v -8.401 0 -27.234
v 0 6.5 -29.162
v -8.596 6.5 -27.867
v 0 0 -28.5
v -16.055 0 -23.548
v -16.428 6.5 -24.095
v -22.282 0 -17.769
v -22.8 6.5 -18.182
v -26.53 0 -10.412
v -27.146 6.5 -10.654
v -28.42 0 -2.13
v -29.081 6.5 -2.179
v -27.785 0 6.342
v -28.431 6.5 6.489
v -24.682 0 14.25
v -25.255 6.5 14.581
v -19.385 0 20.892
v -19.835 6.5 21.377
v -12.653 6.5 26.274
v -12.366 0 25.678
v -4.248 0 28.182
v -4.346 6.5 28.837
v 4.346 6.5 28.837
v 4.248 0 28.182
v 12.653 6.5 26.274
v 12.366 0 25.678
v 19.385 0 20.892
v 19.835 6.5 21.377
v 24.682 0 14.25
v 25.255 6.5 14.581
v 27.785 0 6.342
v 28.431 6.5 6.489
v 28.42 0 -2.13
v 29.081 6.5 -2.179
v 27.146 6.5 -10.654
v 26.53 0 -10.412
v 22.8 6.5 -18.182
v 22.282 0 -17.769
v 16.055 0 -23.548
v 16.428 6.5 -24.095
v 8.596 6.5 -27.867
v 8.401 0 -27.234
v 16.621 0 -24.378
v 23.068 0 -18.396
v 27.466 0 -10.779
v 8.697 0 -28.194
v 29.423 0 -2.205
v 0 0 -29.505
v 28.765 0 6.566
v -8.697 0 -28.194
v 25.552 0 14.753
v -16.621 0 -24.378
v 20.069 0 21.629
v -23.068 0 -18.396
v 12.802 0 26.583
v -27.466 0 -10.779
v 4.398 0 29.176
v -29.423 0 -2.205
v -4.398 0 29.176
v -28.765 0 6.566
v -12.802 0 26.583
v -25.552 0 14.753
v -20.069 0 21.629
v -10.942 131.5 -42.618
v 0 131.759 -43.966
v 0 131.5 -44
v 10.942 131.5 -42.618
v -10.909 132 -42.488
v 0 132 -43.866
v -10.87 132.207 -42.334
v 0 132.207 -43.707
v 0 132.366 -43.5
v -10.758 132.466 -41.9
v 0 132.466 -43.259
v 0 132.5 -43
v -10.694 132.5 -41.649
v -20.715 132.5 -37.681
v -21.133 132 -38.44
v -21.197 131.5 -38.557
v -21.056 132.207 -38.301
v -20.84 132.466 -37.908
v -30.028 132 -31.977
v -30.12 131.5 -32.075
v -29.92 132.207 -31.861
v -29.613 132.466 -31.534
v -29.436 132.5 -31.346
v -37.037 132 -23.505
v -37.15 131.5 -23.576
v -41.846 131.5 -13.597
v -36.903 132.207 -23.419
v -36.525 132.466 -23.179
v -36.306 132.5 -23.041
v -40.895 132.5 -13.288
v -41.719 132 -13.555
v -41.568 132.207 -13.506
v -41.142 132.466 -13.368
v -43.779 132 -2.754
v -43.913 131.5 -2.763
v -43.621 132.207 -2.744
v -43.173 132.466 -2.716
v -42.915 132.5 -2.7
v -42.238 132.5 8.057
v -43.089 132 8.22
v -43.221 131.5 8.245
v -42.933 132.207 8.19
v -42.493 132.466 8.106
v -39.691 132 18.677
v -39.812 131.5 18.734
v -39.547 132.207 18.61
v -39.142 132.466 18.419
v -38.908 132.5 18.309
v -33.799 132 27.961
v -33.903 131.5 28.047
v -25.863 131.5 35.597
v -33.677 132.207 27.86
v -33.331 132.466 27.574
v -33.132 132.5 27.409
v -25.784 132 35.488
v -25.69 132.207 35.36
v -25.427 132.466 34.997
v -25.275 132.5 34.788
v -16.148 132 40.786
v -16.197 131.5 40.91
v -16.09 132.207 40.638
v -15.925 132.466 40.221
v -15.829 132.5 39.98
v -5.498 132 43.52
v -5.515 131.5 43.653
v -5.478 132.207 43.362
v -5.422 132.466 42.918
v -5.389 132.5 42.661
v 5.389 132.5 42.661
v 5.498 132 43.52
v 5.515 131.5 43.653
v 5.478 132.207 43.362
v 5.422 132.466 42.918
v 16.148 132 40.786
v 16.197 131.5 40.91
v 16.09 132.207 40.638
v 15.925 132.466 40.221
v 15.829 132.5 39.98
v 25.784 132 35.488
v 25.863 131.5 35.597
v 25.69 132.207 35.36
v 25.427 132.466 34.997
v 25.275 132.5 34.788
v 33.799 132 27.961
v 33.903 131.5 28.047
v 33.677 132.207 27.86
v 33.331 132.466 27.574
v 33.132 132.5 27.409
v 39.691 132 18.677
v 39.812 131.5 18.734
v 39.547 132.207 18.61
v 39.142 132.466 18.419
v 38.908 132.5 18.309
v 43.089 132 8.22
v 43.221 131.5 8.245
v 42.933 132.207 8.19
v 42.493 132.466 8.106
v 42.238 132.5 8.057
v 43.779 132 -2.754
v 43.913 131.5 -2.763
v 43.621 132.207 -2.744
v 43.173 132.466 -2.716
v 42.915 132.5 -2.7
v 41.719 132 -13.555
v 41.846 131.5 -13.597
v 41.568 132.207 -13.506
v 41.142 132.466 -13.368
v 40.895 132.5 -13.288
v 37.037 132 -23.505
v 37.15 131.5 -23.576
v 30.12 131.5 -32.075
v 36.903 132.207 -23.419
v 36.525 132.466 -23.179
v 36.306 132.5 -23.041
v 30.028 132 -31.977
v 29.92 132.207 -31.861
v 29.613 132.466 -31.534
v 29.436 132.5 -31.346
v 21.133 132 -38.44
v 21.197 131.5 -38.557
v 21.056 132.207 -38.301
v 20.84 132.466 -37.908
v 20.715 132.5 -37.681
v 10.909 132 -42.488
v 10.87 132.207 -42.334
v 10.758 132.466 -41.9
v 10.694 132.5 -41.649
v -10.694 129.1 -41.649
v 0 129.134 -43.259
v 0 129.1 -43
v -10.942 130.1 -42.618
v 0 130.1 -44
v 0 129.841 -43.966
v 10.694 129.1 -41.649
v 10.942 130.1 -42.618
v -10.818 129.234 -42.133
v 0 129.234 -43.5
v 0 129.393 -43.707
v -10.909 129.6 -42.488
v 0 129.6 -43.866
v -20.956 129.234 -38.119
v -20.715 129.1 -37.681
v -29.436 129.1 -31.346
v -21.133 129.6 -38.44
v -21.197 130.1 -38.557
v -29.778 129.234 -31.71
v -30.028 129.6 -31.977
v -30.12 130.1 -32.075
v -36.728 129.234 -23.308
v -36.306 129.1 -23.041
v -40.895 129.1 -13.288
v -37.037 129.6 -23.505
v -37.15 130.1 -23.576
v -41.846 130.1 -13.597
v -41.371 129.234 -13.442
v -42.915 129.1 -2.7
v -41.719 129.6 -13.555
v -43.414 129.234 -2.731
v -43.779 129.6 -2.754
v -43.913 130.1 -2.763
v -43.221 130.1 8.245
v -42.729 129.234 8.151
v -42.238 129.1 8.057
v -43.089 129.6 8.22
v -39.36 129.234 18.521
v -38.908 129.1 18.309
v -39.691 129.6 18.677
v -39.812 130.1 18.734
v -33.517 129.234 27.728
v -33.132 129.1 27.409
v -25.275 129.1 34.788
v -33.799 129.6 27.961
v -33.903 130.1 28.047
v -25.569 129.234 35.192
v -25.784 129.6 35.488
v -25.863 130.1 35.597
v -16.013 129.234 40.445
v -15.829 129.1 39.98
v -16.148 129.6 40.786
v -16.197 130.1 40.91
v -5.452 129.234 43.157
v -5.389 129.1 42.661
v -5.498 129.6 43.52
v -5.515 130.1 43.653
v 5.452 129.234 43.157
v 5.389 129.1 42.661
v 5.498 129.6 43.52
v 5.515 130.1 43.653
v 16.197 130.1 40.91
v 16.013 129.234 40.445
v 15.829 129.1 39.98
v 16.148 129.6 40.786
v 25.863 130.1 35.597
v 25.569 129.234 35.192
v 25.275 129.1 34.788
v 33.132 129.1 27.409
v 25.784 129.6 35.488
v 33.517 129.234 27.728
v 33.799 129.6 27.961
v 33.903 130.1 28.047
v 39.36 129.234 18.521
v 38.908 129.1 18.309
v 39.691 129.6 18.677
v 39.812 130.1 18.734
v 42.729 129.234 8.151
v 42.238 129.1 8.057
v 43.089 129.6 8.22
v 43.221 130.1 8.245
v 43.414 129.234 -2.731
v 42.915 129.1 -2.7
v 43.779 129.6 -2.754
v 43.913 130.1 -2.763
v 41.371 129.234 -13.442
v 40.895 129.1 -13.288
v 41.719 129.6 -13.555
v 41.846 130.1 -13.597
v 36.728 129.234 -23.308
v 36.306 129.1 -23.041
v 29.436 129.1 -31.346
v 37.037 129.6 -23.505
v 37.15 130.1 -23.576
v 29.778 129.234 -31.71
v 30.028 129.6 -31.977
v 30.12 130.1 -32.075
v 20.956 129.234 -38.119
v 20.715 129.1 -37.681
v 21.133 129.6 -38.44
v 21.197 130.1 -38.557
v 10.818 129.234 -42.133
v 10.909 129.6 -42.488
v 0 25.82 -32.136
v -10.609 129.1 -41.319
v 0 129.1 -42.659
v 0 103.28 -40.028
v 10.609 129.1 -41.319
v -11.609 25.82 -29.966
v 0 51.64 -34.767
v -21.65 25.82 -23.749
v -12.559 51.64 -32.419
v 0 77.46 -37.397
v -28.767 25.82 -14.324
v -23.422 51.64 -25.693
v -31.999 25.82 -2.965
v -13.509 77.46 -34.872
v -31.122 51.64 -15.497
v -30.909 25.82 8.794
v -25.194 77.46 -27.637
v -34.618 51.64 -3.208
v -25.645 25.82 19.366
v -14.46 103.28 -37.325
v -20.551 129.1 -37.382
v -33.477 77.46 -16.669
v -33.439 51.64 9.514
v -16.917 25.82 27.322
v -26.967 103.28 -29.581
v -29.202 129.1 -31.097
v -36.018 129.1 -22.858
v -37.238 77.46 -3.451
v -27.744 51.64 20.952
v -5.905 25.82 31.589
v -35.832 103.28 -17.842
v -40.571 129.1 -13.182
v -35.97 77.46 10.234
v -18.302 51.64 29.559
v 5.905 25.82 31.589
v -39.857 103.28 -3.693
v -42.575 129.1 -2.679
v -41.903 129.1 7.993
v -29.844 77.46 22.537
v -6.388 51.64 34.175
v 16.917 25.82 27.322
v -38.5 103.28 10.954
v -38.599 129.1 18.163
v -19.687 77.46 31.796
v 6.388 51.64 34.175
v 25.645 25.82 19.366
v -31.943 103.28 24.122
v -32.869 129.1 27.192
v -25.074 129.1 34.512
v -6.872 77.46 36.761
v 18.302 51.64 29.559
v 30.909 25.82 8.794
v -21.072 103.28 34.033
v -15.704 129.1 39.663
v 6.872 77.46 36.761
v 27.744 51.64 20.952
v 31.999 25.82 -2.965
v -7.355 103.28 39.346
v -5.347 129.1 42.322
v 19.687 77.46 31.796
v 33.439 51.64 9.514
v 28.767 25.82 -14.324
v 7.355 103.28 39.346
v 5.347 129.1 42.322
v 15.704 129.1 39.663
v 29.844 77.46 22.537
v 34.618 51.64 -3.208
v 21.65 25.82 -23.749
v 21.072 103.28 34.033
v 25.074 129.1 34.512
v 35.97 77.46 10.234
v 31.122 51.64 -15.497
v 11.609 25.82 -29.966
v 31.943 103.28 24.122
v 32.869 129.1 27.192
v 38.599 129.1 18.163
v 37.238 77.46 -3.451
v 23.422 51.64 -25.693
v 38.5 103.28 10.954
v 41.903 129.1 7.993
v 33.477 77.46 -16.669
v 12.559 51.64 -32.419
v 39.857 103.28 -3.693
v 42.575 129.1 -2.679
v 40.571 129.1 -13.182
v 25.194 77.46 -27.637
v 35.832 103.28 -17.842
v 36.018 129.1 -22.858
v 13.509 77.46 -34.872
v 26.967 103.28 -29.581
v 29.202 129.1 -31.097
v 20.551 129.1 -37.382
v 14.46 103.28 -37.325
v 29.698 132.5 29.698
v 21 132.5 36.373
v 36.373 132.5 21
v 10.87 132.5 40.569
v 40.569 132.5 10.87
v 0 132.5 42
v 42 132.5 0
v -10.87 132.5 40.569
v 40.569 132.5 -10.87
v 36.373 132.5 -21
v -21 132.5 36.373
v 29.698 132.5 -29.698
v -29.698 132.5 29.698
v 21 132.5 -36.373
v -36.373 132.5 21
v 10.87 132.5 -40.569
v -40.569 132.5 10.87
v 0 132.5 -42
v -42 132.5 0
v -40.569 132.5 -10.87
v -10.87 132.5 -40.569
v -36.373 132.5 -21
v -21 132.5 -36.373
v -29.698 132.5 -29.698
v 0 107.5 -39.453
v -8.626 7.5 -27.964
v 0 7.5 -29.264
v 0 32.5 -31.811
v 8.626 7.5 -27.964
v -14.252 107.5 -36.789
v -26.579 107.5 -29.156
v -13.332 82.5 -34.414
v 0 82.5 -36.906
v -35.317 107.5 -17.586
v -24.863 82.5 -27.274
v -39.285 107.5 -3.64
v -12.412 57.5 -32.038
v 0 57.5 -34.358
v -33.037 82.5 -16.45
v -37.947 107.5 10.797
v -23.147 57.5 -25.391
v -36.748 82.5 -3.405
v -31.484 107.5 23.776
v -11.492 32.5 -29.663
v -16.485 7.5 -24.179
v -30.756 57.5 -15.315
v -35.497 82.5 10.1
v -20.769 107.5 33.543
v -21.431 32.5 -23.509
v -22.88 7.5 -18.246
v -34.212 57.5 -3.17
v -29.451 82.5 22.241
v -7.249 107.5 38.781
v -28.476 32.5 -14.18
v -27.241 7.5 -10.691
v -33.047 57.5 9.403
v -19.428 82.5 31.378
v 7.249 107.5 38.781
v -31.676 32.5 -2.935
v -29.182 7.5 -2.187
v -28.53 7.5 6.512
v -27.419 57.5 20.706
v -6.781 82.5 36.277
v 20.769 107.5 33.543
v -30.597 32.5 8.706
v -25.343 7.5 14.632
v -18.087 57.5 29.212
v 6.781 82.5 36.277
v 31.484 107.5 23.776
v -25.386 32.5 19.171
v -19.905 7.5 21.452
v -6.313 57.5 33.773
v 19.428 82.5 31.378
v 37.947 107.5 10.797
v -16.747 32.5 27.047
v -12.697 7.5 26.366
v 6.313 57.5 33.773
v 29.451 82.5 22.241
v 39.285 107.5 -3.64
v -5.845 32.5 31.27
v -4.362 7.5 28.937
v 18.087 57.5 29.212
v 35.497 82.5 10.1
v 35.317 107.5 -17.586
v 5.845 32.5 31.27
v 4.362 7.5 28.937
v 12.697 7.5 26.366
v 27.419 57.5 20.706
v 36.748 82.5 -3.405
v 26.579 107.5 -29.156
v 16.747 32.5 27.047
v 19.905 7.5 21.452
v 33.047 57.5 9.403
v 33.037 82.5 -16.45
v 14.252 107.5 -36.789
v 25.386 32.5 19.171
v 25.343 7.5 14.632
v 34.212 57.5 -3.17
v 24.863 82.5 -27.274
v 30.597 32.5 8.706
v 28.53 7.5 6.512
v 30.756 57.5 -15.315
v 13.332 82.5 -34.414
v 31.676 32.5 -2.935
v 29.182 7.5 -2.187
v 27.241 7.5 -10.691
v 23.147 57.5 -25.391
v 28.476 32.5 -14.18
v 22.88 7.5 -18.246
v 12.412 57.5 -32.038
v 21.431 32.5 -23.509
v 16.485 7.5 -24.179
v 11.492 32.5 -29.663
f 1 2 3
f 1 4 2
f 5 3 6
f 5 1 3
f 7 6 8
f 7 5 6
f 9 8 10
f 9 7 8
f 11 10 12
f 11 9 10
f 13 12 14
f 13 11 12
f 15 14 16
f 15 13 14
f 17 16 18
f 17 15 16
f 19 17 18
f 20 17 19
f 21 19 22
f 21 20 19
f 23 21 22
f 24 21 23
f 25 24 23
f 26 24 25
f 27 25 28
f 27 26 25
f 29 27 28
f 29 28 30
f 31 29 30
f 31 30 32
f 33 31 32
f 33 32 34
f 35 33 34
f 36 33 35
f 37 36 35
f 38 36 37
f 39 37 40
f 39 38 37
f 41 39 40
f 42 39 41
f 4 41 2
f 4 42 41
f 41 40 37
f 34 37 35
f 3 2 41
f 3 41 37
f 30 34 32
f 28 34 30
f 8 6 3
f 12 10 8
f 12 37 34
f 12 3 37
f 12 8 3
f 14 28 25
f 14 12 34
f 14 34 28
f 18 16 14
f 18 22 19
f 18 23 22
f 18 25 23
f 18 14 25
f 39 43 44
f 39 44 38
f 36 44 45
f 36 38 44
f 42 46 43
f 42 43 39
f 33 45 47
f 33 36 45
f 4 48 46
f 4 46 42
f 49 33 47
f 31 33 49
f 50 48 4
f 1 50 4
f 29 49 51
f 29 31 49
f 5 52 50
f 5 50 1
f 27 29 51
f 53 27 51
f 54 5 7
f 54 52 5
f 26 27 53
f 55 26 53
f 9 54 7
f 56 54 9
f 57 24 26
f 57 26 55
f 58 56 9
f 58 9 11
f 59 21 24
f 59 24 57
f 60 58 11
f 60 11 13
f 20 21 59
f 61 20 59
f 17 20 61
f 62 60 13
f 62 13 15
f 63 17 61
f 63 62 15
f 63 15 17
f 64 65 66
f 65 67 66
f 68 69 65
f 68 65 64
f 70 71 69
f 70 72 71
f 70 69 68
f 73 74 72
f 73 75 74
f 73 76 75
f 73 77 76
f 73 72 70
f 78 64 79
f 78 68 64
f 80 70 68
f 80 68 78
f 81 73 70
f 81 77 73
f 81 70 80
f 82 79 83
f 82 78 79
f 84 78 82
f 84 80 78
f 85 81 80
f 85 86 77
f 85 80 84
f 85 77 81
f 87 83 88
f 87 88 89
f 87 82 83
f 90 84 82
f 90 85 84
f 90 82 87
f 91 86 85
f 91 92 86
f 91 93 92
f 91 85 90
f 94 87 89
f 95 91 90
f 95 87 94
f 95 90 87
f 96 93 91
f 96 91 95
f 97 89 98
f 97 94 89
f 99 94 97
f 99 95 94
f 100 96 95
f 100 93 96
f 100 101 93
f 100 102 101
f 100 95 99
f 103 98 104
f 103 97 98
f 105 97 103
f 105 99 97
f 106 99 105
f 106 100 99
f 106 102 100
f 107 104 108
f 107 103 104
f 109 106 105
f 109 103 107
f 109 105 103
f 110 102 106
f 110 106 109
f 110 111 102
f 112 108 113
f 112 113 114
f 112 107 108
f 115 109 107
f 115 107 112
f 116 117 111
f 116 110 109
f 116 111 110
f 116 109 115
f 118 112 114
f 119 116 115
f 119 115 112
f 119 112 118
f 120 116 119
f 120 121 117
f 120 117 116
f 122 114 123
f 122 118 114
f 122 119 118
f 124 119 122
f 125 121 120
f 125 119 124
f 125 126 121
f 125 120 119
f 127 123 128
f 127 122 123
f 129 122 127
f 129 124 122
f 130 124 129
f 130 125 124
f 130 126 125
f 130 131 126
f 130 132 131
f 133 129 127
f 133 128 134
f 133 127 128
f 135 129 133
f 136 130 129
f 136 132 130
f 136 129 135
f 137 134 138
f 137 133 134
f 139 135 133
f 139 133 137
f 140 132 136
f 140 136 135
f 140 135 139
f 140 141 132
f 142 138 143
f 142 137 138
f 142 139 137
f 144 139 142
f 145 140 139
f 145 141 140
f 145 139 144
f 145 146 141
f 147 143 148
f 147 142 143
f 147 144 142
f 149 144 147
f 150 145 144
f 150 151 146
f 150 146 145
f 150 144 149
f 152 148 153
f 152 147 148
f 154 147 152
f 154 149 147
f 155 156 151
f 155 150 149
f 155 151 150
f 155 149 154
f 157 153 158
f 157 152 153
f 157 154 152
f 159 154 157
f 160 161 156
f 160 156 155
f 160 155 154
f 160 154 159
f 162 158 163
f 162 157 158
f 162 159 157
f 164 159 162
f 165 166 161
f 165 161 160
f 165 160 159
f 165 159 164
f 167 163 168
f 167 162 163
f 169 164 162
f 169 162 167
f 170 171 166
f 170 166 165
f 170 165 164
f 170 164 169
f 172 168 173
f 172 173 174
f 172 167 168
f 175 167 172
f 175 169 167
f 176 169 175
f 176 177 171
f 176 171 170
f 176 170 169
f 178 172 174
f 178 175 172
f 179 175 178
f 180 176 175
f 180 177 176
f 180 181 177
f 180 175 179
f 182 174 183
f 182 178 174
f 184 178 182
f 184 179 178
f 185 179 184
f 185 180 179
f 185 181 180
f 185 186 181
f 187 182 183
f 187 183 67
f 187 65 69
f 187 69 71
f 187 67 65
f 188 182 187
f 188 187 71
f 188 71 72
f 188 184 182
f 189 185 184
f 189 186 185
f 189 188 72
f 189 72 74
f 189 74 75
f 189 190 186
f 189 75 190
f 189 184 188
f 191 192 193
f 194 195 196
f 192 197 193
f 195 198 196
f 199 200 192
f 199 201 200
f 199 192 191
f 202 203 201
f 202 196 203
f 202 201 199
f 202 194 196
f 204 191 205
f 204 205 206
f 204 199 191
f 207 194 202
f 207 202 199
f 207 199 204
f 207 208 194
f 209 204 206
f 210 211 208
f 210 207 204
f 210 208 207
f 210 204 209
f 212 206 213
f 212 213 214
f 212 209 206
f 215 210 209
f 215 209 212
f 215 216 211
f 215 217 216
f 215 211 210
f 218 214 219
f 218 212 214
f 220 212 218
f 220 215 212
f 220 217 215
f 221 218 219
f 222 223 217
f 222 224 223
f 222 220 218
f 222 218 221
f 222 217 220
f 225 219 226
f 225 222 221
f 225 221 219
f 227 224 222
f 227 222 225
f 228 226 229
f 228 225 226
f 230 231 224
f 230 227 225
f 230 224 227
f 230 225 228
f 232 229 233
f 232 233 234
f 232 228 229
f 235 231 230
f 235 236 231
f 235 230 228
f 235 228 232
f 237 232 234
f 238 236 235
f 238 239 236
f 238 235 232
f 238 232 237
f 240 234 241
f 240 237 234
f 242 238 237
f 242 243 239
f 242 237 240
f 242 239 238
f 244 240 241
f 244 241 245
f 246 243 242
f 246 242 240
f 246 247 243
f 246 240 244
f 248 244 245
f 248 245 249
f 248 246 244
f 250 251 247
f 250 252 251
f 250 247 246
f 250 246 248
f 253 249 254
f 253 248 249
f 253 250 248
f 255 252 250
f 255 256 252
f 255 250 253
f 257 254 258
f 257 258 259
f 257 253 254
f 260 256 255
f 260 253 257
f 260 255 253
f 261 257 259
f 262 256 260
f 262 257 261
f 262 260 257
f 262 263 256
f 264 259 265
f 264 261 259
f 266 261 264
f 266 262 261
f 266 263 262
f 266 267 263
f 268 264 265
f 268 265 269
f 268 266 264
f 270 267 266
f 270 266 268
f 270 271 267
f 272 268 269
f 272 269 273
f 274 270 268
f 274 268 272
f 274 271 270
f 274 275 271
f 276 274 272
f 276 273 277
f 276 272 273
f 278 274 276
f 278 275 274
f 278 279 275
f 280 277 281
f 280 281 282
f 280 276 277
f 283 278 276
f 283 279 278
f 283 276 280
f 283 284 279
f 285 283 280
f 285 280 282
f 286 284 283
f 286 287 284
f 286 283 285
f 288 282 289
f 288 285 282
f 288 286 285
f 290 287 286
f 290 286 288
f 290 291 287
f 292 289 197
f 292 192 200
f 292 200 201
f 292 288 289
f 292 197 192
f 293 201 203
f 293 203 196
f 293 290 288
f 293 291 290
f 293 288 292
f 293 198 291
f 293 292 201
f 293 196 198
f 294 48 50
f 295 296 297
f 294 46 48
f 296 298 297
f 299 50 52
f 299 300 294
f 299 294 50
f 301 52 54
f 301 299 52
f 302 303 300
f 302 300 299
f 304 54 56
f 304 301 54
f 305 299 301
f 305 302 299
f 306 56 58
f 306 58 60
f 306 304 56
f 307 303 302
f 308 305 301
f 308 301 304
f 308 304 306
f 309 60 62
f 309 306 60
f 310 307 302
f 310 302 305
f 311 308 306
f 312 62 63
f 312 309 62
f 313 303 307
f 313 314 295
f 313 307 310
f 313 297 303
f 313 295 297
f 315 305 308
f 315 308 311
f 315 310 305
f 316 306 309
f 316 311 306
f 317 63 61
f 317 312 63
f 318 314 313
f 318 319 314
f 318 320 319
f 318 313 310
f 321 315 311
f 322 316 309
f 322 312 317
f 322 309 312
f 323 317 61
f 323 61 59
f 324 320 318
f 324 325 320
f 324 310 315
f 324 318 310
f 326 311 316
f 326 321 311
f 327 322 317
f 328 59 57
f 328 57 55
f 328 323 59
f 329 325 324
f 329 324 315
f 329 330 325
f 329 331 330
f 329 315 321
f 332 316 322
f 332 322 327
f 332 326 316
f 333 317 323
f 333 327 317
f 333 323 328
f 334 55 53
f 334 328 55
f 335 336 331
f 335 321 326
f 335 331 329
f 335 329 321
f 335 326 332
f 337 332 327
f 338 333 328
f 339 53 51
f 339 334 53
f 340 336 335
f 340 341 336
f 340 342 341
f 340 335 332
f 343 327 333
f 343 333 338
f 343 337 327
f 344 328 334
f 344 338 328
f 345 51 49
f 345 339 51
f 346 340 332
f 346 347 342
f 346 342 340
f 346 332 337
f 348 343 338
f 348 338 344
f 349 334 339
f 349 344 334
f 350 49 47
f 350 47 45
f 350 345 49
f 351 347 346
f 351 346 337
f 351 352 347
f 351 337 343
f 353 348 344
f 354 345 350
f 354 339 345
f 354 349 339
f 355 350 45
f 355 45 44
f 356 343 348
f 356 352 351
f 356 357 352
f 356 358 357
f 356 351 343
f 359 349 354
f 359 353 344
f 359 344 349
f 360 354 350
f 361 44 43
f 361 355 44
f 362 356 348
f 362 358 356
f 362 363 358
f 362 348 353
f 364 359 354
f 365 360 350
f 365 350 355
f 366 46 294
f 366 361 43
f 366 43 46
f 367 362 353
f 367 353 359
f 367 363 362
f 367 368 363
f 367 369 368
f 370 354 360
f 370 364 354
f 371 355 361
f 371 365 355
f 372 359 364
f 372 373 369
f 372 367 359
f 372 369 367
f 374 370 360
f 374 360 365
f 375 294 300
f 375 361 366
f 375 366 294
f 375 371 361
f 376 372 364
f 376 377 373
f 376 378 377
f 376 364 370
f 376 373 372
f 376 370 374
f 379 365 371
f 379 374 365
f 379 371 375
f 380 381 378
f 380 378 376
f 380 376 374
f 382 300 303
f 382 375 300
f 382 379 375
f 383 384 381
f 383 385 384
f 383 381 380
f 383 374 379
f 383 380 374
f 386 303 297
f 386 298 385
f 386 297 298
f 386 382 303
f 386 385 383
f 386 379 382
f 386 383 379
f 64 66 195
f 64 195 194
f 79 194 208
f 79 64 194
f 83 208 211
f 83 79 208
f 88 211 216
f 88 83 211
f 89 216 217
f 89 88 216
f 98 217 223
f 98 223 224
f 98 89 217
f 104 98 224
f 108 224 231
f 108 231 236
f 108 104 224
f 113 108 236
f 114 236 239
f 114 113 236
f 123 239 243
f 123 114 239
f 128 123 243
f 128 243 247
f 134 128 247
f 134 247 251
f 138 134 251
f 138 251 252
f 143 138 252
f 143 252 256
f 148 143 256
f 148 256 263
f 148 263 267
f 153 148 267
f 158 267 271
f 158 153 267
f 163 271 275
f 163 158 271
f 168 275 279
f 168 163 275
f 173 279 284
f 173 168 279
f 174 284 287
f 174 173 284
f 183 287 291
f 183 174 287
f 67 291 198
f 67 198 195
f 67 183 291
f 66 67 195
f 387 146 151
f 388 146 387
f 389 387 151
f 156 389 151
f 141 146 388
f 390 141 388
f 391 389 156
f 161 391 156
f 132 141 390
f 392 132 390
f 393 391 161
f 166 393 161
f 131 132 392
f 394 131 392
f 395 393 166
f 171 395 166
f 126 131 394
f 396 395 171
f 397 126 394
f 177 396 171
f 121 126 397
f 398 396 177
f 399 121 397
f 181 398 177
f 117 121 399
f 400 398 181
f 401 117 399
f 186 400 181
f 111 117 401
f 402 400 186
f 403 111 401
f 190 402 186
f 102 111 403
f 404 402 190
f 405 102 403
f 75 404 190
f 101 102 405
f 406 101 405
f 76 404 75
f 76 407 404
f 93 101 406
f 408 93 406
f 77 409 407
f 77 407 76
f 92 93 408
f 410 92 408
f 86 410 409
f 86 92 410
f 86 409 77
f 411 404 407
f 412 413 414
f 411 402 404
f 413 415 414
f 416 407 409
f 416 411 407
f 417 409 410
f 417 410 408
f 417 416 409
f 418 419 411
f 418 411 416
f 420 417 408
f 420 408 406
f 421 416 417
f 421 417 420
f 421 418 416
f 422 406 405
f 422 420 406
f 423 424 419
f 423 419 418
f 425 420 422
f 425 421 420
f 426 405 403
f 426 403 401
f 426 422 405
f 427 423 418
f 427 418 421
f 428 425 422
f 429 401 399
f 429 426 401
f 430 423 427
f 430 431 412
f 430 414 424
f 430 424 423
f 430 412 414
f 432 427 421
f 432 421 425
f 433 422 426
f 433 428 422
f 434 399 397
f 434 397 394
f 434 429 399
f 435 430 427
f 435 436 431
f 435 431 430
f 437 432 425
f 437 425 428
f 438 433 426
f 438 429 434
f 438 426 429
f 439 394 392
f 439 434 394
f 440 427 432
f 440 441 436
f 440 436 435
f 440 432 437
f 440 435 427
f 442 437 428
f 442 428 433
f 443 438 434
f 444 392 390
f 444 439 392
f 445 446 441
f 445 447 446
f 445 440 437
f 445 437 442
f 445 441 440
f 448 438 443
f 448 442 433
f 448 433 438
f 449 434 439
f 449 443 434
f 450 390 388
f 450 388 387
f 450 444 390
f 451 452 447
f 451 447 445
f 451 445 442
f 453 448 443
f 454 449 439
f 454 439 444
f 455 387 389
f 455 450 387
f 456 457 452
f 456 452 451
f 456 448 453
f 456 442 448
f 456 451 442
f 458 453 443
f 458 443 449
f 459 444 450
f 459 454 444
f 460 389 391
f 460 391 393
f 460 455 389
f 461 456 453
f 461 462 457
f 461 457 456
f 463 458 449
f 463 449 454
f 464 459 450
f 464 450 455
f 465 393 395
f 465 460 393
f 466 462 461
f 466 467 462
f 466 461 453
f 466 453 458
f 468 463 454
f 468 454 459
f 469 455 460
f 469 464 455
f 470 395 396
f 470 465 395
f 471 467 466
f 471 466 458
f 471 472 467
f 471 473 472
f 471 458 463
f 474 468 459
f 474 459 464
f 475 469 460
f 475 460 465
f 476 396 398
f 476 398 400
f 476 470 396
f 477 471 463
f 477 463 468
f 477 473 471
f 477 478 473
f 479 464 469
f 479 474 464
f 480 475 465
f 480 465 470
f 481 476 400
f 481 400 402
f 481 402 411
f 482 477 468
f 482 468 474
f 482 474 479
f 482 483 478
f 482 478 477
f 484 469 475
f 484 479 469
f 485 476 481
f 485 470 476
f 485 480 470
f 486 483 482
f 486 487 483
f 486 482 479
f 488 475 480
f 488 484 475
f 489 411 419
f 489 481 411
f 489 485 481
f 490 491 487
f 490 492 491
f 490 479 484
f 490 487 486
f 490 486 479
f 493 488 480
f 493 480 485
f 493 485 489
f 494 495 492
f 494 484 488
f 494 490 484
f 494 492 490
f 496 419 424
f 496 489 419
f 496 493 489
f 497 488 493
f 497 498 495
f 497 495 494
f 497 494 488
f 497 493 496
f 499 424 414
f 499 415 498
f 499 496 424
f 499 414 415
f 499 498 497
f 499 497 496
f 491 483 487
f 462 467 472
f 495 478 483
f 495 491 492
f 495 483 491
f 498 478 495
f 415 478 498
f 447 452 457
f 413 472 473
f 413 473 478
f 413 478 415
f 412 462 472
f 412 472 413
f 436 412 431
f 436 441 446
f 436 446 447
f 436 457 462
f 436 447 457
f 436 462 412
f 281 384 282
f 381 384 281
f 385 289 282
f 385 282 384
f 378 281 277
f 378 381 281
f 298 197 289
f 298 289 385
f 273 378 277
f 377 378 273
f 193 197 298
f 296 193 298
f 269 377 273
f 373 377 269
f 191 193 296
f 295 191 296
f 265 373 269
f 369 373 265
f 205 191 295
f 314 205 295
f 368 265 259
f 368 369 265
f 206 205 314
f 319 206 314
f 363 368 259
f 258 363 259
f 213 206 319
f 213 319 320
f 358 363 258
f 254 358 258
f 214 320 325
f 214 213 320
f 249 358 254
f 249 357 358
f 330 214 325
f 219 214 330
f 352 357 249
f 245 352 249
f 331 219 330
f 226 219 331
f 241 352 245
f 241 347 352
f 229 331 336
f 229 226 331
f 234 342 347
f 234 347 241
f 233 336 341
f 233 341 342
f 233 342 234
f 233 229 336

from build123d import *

# Parameters (mm, degrees)
REDONDEO1_R = 1


with BuildPart() as part:
    # Croquis1 → Revolución1 (revolve)
    with BuildSketch(Plane.XY, mode=Mode.PRIVATE) as revoluci_n1_sk:
        Polygon((29.505177058, 0), (42.658761964, 129.1), (44, 129.1), (44, 132.5), (42, 132.5), (29.264150943, 7.5), (0, 7.5), (0, 6.5), (29.162264151, 6.5), (28.5, 0), align=None)
    revolve(revoluci_n1_sk.sketch.rotate(Axis((0, 0, 0), (0, 1, 0)), 90), axis=Axis((0, 0, 0), (0, 1, 0)))

    # Redondeo1
    redondeo1_edges = [part.edges().sort_by_distance(p)[0] for p in [
        (0, 132.5, 44),
        (0, 129.1, 44),
    ]]
    fillet(redondeo1_edges, radius=REDONDEO1_R)


solid = part.part
